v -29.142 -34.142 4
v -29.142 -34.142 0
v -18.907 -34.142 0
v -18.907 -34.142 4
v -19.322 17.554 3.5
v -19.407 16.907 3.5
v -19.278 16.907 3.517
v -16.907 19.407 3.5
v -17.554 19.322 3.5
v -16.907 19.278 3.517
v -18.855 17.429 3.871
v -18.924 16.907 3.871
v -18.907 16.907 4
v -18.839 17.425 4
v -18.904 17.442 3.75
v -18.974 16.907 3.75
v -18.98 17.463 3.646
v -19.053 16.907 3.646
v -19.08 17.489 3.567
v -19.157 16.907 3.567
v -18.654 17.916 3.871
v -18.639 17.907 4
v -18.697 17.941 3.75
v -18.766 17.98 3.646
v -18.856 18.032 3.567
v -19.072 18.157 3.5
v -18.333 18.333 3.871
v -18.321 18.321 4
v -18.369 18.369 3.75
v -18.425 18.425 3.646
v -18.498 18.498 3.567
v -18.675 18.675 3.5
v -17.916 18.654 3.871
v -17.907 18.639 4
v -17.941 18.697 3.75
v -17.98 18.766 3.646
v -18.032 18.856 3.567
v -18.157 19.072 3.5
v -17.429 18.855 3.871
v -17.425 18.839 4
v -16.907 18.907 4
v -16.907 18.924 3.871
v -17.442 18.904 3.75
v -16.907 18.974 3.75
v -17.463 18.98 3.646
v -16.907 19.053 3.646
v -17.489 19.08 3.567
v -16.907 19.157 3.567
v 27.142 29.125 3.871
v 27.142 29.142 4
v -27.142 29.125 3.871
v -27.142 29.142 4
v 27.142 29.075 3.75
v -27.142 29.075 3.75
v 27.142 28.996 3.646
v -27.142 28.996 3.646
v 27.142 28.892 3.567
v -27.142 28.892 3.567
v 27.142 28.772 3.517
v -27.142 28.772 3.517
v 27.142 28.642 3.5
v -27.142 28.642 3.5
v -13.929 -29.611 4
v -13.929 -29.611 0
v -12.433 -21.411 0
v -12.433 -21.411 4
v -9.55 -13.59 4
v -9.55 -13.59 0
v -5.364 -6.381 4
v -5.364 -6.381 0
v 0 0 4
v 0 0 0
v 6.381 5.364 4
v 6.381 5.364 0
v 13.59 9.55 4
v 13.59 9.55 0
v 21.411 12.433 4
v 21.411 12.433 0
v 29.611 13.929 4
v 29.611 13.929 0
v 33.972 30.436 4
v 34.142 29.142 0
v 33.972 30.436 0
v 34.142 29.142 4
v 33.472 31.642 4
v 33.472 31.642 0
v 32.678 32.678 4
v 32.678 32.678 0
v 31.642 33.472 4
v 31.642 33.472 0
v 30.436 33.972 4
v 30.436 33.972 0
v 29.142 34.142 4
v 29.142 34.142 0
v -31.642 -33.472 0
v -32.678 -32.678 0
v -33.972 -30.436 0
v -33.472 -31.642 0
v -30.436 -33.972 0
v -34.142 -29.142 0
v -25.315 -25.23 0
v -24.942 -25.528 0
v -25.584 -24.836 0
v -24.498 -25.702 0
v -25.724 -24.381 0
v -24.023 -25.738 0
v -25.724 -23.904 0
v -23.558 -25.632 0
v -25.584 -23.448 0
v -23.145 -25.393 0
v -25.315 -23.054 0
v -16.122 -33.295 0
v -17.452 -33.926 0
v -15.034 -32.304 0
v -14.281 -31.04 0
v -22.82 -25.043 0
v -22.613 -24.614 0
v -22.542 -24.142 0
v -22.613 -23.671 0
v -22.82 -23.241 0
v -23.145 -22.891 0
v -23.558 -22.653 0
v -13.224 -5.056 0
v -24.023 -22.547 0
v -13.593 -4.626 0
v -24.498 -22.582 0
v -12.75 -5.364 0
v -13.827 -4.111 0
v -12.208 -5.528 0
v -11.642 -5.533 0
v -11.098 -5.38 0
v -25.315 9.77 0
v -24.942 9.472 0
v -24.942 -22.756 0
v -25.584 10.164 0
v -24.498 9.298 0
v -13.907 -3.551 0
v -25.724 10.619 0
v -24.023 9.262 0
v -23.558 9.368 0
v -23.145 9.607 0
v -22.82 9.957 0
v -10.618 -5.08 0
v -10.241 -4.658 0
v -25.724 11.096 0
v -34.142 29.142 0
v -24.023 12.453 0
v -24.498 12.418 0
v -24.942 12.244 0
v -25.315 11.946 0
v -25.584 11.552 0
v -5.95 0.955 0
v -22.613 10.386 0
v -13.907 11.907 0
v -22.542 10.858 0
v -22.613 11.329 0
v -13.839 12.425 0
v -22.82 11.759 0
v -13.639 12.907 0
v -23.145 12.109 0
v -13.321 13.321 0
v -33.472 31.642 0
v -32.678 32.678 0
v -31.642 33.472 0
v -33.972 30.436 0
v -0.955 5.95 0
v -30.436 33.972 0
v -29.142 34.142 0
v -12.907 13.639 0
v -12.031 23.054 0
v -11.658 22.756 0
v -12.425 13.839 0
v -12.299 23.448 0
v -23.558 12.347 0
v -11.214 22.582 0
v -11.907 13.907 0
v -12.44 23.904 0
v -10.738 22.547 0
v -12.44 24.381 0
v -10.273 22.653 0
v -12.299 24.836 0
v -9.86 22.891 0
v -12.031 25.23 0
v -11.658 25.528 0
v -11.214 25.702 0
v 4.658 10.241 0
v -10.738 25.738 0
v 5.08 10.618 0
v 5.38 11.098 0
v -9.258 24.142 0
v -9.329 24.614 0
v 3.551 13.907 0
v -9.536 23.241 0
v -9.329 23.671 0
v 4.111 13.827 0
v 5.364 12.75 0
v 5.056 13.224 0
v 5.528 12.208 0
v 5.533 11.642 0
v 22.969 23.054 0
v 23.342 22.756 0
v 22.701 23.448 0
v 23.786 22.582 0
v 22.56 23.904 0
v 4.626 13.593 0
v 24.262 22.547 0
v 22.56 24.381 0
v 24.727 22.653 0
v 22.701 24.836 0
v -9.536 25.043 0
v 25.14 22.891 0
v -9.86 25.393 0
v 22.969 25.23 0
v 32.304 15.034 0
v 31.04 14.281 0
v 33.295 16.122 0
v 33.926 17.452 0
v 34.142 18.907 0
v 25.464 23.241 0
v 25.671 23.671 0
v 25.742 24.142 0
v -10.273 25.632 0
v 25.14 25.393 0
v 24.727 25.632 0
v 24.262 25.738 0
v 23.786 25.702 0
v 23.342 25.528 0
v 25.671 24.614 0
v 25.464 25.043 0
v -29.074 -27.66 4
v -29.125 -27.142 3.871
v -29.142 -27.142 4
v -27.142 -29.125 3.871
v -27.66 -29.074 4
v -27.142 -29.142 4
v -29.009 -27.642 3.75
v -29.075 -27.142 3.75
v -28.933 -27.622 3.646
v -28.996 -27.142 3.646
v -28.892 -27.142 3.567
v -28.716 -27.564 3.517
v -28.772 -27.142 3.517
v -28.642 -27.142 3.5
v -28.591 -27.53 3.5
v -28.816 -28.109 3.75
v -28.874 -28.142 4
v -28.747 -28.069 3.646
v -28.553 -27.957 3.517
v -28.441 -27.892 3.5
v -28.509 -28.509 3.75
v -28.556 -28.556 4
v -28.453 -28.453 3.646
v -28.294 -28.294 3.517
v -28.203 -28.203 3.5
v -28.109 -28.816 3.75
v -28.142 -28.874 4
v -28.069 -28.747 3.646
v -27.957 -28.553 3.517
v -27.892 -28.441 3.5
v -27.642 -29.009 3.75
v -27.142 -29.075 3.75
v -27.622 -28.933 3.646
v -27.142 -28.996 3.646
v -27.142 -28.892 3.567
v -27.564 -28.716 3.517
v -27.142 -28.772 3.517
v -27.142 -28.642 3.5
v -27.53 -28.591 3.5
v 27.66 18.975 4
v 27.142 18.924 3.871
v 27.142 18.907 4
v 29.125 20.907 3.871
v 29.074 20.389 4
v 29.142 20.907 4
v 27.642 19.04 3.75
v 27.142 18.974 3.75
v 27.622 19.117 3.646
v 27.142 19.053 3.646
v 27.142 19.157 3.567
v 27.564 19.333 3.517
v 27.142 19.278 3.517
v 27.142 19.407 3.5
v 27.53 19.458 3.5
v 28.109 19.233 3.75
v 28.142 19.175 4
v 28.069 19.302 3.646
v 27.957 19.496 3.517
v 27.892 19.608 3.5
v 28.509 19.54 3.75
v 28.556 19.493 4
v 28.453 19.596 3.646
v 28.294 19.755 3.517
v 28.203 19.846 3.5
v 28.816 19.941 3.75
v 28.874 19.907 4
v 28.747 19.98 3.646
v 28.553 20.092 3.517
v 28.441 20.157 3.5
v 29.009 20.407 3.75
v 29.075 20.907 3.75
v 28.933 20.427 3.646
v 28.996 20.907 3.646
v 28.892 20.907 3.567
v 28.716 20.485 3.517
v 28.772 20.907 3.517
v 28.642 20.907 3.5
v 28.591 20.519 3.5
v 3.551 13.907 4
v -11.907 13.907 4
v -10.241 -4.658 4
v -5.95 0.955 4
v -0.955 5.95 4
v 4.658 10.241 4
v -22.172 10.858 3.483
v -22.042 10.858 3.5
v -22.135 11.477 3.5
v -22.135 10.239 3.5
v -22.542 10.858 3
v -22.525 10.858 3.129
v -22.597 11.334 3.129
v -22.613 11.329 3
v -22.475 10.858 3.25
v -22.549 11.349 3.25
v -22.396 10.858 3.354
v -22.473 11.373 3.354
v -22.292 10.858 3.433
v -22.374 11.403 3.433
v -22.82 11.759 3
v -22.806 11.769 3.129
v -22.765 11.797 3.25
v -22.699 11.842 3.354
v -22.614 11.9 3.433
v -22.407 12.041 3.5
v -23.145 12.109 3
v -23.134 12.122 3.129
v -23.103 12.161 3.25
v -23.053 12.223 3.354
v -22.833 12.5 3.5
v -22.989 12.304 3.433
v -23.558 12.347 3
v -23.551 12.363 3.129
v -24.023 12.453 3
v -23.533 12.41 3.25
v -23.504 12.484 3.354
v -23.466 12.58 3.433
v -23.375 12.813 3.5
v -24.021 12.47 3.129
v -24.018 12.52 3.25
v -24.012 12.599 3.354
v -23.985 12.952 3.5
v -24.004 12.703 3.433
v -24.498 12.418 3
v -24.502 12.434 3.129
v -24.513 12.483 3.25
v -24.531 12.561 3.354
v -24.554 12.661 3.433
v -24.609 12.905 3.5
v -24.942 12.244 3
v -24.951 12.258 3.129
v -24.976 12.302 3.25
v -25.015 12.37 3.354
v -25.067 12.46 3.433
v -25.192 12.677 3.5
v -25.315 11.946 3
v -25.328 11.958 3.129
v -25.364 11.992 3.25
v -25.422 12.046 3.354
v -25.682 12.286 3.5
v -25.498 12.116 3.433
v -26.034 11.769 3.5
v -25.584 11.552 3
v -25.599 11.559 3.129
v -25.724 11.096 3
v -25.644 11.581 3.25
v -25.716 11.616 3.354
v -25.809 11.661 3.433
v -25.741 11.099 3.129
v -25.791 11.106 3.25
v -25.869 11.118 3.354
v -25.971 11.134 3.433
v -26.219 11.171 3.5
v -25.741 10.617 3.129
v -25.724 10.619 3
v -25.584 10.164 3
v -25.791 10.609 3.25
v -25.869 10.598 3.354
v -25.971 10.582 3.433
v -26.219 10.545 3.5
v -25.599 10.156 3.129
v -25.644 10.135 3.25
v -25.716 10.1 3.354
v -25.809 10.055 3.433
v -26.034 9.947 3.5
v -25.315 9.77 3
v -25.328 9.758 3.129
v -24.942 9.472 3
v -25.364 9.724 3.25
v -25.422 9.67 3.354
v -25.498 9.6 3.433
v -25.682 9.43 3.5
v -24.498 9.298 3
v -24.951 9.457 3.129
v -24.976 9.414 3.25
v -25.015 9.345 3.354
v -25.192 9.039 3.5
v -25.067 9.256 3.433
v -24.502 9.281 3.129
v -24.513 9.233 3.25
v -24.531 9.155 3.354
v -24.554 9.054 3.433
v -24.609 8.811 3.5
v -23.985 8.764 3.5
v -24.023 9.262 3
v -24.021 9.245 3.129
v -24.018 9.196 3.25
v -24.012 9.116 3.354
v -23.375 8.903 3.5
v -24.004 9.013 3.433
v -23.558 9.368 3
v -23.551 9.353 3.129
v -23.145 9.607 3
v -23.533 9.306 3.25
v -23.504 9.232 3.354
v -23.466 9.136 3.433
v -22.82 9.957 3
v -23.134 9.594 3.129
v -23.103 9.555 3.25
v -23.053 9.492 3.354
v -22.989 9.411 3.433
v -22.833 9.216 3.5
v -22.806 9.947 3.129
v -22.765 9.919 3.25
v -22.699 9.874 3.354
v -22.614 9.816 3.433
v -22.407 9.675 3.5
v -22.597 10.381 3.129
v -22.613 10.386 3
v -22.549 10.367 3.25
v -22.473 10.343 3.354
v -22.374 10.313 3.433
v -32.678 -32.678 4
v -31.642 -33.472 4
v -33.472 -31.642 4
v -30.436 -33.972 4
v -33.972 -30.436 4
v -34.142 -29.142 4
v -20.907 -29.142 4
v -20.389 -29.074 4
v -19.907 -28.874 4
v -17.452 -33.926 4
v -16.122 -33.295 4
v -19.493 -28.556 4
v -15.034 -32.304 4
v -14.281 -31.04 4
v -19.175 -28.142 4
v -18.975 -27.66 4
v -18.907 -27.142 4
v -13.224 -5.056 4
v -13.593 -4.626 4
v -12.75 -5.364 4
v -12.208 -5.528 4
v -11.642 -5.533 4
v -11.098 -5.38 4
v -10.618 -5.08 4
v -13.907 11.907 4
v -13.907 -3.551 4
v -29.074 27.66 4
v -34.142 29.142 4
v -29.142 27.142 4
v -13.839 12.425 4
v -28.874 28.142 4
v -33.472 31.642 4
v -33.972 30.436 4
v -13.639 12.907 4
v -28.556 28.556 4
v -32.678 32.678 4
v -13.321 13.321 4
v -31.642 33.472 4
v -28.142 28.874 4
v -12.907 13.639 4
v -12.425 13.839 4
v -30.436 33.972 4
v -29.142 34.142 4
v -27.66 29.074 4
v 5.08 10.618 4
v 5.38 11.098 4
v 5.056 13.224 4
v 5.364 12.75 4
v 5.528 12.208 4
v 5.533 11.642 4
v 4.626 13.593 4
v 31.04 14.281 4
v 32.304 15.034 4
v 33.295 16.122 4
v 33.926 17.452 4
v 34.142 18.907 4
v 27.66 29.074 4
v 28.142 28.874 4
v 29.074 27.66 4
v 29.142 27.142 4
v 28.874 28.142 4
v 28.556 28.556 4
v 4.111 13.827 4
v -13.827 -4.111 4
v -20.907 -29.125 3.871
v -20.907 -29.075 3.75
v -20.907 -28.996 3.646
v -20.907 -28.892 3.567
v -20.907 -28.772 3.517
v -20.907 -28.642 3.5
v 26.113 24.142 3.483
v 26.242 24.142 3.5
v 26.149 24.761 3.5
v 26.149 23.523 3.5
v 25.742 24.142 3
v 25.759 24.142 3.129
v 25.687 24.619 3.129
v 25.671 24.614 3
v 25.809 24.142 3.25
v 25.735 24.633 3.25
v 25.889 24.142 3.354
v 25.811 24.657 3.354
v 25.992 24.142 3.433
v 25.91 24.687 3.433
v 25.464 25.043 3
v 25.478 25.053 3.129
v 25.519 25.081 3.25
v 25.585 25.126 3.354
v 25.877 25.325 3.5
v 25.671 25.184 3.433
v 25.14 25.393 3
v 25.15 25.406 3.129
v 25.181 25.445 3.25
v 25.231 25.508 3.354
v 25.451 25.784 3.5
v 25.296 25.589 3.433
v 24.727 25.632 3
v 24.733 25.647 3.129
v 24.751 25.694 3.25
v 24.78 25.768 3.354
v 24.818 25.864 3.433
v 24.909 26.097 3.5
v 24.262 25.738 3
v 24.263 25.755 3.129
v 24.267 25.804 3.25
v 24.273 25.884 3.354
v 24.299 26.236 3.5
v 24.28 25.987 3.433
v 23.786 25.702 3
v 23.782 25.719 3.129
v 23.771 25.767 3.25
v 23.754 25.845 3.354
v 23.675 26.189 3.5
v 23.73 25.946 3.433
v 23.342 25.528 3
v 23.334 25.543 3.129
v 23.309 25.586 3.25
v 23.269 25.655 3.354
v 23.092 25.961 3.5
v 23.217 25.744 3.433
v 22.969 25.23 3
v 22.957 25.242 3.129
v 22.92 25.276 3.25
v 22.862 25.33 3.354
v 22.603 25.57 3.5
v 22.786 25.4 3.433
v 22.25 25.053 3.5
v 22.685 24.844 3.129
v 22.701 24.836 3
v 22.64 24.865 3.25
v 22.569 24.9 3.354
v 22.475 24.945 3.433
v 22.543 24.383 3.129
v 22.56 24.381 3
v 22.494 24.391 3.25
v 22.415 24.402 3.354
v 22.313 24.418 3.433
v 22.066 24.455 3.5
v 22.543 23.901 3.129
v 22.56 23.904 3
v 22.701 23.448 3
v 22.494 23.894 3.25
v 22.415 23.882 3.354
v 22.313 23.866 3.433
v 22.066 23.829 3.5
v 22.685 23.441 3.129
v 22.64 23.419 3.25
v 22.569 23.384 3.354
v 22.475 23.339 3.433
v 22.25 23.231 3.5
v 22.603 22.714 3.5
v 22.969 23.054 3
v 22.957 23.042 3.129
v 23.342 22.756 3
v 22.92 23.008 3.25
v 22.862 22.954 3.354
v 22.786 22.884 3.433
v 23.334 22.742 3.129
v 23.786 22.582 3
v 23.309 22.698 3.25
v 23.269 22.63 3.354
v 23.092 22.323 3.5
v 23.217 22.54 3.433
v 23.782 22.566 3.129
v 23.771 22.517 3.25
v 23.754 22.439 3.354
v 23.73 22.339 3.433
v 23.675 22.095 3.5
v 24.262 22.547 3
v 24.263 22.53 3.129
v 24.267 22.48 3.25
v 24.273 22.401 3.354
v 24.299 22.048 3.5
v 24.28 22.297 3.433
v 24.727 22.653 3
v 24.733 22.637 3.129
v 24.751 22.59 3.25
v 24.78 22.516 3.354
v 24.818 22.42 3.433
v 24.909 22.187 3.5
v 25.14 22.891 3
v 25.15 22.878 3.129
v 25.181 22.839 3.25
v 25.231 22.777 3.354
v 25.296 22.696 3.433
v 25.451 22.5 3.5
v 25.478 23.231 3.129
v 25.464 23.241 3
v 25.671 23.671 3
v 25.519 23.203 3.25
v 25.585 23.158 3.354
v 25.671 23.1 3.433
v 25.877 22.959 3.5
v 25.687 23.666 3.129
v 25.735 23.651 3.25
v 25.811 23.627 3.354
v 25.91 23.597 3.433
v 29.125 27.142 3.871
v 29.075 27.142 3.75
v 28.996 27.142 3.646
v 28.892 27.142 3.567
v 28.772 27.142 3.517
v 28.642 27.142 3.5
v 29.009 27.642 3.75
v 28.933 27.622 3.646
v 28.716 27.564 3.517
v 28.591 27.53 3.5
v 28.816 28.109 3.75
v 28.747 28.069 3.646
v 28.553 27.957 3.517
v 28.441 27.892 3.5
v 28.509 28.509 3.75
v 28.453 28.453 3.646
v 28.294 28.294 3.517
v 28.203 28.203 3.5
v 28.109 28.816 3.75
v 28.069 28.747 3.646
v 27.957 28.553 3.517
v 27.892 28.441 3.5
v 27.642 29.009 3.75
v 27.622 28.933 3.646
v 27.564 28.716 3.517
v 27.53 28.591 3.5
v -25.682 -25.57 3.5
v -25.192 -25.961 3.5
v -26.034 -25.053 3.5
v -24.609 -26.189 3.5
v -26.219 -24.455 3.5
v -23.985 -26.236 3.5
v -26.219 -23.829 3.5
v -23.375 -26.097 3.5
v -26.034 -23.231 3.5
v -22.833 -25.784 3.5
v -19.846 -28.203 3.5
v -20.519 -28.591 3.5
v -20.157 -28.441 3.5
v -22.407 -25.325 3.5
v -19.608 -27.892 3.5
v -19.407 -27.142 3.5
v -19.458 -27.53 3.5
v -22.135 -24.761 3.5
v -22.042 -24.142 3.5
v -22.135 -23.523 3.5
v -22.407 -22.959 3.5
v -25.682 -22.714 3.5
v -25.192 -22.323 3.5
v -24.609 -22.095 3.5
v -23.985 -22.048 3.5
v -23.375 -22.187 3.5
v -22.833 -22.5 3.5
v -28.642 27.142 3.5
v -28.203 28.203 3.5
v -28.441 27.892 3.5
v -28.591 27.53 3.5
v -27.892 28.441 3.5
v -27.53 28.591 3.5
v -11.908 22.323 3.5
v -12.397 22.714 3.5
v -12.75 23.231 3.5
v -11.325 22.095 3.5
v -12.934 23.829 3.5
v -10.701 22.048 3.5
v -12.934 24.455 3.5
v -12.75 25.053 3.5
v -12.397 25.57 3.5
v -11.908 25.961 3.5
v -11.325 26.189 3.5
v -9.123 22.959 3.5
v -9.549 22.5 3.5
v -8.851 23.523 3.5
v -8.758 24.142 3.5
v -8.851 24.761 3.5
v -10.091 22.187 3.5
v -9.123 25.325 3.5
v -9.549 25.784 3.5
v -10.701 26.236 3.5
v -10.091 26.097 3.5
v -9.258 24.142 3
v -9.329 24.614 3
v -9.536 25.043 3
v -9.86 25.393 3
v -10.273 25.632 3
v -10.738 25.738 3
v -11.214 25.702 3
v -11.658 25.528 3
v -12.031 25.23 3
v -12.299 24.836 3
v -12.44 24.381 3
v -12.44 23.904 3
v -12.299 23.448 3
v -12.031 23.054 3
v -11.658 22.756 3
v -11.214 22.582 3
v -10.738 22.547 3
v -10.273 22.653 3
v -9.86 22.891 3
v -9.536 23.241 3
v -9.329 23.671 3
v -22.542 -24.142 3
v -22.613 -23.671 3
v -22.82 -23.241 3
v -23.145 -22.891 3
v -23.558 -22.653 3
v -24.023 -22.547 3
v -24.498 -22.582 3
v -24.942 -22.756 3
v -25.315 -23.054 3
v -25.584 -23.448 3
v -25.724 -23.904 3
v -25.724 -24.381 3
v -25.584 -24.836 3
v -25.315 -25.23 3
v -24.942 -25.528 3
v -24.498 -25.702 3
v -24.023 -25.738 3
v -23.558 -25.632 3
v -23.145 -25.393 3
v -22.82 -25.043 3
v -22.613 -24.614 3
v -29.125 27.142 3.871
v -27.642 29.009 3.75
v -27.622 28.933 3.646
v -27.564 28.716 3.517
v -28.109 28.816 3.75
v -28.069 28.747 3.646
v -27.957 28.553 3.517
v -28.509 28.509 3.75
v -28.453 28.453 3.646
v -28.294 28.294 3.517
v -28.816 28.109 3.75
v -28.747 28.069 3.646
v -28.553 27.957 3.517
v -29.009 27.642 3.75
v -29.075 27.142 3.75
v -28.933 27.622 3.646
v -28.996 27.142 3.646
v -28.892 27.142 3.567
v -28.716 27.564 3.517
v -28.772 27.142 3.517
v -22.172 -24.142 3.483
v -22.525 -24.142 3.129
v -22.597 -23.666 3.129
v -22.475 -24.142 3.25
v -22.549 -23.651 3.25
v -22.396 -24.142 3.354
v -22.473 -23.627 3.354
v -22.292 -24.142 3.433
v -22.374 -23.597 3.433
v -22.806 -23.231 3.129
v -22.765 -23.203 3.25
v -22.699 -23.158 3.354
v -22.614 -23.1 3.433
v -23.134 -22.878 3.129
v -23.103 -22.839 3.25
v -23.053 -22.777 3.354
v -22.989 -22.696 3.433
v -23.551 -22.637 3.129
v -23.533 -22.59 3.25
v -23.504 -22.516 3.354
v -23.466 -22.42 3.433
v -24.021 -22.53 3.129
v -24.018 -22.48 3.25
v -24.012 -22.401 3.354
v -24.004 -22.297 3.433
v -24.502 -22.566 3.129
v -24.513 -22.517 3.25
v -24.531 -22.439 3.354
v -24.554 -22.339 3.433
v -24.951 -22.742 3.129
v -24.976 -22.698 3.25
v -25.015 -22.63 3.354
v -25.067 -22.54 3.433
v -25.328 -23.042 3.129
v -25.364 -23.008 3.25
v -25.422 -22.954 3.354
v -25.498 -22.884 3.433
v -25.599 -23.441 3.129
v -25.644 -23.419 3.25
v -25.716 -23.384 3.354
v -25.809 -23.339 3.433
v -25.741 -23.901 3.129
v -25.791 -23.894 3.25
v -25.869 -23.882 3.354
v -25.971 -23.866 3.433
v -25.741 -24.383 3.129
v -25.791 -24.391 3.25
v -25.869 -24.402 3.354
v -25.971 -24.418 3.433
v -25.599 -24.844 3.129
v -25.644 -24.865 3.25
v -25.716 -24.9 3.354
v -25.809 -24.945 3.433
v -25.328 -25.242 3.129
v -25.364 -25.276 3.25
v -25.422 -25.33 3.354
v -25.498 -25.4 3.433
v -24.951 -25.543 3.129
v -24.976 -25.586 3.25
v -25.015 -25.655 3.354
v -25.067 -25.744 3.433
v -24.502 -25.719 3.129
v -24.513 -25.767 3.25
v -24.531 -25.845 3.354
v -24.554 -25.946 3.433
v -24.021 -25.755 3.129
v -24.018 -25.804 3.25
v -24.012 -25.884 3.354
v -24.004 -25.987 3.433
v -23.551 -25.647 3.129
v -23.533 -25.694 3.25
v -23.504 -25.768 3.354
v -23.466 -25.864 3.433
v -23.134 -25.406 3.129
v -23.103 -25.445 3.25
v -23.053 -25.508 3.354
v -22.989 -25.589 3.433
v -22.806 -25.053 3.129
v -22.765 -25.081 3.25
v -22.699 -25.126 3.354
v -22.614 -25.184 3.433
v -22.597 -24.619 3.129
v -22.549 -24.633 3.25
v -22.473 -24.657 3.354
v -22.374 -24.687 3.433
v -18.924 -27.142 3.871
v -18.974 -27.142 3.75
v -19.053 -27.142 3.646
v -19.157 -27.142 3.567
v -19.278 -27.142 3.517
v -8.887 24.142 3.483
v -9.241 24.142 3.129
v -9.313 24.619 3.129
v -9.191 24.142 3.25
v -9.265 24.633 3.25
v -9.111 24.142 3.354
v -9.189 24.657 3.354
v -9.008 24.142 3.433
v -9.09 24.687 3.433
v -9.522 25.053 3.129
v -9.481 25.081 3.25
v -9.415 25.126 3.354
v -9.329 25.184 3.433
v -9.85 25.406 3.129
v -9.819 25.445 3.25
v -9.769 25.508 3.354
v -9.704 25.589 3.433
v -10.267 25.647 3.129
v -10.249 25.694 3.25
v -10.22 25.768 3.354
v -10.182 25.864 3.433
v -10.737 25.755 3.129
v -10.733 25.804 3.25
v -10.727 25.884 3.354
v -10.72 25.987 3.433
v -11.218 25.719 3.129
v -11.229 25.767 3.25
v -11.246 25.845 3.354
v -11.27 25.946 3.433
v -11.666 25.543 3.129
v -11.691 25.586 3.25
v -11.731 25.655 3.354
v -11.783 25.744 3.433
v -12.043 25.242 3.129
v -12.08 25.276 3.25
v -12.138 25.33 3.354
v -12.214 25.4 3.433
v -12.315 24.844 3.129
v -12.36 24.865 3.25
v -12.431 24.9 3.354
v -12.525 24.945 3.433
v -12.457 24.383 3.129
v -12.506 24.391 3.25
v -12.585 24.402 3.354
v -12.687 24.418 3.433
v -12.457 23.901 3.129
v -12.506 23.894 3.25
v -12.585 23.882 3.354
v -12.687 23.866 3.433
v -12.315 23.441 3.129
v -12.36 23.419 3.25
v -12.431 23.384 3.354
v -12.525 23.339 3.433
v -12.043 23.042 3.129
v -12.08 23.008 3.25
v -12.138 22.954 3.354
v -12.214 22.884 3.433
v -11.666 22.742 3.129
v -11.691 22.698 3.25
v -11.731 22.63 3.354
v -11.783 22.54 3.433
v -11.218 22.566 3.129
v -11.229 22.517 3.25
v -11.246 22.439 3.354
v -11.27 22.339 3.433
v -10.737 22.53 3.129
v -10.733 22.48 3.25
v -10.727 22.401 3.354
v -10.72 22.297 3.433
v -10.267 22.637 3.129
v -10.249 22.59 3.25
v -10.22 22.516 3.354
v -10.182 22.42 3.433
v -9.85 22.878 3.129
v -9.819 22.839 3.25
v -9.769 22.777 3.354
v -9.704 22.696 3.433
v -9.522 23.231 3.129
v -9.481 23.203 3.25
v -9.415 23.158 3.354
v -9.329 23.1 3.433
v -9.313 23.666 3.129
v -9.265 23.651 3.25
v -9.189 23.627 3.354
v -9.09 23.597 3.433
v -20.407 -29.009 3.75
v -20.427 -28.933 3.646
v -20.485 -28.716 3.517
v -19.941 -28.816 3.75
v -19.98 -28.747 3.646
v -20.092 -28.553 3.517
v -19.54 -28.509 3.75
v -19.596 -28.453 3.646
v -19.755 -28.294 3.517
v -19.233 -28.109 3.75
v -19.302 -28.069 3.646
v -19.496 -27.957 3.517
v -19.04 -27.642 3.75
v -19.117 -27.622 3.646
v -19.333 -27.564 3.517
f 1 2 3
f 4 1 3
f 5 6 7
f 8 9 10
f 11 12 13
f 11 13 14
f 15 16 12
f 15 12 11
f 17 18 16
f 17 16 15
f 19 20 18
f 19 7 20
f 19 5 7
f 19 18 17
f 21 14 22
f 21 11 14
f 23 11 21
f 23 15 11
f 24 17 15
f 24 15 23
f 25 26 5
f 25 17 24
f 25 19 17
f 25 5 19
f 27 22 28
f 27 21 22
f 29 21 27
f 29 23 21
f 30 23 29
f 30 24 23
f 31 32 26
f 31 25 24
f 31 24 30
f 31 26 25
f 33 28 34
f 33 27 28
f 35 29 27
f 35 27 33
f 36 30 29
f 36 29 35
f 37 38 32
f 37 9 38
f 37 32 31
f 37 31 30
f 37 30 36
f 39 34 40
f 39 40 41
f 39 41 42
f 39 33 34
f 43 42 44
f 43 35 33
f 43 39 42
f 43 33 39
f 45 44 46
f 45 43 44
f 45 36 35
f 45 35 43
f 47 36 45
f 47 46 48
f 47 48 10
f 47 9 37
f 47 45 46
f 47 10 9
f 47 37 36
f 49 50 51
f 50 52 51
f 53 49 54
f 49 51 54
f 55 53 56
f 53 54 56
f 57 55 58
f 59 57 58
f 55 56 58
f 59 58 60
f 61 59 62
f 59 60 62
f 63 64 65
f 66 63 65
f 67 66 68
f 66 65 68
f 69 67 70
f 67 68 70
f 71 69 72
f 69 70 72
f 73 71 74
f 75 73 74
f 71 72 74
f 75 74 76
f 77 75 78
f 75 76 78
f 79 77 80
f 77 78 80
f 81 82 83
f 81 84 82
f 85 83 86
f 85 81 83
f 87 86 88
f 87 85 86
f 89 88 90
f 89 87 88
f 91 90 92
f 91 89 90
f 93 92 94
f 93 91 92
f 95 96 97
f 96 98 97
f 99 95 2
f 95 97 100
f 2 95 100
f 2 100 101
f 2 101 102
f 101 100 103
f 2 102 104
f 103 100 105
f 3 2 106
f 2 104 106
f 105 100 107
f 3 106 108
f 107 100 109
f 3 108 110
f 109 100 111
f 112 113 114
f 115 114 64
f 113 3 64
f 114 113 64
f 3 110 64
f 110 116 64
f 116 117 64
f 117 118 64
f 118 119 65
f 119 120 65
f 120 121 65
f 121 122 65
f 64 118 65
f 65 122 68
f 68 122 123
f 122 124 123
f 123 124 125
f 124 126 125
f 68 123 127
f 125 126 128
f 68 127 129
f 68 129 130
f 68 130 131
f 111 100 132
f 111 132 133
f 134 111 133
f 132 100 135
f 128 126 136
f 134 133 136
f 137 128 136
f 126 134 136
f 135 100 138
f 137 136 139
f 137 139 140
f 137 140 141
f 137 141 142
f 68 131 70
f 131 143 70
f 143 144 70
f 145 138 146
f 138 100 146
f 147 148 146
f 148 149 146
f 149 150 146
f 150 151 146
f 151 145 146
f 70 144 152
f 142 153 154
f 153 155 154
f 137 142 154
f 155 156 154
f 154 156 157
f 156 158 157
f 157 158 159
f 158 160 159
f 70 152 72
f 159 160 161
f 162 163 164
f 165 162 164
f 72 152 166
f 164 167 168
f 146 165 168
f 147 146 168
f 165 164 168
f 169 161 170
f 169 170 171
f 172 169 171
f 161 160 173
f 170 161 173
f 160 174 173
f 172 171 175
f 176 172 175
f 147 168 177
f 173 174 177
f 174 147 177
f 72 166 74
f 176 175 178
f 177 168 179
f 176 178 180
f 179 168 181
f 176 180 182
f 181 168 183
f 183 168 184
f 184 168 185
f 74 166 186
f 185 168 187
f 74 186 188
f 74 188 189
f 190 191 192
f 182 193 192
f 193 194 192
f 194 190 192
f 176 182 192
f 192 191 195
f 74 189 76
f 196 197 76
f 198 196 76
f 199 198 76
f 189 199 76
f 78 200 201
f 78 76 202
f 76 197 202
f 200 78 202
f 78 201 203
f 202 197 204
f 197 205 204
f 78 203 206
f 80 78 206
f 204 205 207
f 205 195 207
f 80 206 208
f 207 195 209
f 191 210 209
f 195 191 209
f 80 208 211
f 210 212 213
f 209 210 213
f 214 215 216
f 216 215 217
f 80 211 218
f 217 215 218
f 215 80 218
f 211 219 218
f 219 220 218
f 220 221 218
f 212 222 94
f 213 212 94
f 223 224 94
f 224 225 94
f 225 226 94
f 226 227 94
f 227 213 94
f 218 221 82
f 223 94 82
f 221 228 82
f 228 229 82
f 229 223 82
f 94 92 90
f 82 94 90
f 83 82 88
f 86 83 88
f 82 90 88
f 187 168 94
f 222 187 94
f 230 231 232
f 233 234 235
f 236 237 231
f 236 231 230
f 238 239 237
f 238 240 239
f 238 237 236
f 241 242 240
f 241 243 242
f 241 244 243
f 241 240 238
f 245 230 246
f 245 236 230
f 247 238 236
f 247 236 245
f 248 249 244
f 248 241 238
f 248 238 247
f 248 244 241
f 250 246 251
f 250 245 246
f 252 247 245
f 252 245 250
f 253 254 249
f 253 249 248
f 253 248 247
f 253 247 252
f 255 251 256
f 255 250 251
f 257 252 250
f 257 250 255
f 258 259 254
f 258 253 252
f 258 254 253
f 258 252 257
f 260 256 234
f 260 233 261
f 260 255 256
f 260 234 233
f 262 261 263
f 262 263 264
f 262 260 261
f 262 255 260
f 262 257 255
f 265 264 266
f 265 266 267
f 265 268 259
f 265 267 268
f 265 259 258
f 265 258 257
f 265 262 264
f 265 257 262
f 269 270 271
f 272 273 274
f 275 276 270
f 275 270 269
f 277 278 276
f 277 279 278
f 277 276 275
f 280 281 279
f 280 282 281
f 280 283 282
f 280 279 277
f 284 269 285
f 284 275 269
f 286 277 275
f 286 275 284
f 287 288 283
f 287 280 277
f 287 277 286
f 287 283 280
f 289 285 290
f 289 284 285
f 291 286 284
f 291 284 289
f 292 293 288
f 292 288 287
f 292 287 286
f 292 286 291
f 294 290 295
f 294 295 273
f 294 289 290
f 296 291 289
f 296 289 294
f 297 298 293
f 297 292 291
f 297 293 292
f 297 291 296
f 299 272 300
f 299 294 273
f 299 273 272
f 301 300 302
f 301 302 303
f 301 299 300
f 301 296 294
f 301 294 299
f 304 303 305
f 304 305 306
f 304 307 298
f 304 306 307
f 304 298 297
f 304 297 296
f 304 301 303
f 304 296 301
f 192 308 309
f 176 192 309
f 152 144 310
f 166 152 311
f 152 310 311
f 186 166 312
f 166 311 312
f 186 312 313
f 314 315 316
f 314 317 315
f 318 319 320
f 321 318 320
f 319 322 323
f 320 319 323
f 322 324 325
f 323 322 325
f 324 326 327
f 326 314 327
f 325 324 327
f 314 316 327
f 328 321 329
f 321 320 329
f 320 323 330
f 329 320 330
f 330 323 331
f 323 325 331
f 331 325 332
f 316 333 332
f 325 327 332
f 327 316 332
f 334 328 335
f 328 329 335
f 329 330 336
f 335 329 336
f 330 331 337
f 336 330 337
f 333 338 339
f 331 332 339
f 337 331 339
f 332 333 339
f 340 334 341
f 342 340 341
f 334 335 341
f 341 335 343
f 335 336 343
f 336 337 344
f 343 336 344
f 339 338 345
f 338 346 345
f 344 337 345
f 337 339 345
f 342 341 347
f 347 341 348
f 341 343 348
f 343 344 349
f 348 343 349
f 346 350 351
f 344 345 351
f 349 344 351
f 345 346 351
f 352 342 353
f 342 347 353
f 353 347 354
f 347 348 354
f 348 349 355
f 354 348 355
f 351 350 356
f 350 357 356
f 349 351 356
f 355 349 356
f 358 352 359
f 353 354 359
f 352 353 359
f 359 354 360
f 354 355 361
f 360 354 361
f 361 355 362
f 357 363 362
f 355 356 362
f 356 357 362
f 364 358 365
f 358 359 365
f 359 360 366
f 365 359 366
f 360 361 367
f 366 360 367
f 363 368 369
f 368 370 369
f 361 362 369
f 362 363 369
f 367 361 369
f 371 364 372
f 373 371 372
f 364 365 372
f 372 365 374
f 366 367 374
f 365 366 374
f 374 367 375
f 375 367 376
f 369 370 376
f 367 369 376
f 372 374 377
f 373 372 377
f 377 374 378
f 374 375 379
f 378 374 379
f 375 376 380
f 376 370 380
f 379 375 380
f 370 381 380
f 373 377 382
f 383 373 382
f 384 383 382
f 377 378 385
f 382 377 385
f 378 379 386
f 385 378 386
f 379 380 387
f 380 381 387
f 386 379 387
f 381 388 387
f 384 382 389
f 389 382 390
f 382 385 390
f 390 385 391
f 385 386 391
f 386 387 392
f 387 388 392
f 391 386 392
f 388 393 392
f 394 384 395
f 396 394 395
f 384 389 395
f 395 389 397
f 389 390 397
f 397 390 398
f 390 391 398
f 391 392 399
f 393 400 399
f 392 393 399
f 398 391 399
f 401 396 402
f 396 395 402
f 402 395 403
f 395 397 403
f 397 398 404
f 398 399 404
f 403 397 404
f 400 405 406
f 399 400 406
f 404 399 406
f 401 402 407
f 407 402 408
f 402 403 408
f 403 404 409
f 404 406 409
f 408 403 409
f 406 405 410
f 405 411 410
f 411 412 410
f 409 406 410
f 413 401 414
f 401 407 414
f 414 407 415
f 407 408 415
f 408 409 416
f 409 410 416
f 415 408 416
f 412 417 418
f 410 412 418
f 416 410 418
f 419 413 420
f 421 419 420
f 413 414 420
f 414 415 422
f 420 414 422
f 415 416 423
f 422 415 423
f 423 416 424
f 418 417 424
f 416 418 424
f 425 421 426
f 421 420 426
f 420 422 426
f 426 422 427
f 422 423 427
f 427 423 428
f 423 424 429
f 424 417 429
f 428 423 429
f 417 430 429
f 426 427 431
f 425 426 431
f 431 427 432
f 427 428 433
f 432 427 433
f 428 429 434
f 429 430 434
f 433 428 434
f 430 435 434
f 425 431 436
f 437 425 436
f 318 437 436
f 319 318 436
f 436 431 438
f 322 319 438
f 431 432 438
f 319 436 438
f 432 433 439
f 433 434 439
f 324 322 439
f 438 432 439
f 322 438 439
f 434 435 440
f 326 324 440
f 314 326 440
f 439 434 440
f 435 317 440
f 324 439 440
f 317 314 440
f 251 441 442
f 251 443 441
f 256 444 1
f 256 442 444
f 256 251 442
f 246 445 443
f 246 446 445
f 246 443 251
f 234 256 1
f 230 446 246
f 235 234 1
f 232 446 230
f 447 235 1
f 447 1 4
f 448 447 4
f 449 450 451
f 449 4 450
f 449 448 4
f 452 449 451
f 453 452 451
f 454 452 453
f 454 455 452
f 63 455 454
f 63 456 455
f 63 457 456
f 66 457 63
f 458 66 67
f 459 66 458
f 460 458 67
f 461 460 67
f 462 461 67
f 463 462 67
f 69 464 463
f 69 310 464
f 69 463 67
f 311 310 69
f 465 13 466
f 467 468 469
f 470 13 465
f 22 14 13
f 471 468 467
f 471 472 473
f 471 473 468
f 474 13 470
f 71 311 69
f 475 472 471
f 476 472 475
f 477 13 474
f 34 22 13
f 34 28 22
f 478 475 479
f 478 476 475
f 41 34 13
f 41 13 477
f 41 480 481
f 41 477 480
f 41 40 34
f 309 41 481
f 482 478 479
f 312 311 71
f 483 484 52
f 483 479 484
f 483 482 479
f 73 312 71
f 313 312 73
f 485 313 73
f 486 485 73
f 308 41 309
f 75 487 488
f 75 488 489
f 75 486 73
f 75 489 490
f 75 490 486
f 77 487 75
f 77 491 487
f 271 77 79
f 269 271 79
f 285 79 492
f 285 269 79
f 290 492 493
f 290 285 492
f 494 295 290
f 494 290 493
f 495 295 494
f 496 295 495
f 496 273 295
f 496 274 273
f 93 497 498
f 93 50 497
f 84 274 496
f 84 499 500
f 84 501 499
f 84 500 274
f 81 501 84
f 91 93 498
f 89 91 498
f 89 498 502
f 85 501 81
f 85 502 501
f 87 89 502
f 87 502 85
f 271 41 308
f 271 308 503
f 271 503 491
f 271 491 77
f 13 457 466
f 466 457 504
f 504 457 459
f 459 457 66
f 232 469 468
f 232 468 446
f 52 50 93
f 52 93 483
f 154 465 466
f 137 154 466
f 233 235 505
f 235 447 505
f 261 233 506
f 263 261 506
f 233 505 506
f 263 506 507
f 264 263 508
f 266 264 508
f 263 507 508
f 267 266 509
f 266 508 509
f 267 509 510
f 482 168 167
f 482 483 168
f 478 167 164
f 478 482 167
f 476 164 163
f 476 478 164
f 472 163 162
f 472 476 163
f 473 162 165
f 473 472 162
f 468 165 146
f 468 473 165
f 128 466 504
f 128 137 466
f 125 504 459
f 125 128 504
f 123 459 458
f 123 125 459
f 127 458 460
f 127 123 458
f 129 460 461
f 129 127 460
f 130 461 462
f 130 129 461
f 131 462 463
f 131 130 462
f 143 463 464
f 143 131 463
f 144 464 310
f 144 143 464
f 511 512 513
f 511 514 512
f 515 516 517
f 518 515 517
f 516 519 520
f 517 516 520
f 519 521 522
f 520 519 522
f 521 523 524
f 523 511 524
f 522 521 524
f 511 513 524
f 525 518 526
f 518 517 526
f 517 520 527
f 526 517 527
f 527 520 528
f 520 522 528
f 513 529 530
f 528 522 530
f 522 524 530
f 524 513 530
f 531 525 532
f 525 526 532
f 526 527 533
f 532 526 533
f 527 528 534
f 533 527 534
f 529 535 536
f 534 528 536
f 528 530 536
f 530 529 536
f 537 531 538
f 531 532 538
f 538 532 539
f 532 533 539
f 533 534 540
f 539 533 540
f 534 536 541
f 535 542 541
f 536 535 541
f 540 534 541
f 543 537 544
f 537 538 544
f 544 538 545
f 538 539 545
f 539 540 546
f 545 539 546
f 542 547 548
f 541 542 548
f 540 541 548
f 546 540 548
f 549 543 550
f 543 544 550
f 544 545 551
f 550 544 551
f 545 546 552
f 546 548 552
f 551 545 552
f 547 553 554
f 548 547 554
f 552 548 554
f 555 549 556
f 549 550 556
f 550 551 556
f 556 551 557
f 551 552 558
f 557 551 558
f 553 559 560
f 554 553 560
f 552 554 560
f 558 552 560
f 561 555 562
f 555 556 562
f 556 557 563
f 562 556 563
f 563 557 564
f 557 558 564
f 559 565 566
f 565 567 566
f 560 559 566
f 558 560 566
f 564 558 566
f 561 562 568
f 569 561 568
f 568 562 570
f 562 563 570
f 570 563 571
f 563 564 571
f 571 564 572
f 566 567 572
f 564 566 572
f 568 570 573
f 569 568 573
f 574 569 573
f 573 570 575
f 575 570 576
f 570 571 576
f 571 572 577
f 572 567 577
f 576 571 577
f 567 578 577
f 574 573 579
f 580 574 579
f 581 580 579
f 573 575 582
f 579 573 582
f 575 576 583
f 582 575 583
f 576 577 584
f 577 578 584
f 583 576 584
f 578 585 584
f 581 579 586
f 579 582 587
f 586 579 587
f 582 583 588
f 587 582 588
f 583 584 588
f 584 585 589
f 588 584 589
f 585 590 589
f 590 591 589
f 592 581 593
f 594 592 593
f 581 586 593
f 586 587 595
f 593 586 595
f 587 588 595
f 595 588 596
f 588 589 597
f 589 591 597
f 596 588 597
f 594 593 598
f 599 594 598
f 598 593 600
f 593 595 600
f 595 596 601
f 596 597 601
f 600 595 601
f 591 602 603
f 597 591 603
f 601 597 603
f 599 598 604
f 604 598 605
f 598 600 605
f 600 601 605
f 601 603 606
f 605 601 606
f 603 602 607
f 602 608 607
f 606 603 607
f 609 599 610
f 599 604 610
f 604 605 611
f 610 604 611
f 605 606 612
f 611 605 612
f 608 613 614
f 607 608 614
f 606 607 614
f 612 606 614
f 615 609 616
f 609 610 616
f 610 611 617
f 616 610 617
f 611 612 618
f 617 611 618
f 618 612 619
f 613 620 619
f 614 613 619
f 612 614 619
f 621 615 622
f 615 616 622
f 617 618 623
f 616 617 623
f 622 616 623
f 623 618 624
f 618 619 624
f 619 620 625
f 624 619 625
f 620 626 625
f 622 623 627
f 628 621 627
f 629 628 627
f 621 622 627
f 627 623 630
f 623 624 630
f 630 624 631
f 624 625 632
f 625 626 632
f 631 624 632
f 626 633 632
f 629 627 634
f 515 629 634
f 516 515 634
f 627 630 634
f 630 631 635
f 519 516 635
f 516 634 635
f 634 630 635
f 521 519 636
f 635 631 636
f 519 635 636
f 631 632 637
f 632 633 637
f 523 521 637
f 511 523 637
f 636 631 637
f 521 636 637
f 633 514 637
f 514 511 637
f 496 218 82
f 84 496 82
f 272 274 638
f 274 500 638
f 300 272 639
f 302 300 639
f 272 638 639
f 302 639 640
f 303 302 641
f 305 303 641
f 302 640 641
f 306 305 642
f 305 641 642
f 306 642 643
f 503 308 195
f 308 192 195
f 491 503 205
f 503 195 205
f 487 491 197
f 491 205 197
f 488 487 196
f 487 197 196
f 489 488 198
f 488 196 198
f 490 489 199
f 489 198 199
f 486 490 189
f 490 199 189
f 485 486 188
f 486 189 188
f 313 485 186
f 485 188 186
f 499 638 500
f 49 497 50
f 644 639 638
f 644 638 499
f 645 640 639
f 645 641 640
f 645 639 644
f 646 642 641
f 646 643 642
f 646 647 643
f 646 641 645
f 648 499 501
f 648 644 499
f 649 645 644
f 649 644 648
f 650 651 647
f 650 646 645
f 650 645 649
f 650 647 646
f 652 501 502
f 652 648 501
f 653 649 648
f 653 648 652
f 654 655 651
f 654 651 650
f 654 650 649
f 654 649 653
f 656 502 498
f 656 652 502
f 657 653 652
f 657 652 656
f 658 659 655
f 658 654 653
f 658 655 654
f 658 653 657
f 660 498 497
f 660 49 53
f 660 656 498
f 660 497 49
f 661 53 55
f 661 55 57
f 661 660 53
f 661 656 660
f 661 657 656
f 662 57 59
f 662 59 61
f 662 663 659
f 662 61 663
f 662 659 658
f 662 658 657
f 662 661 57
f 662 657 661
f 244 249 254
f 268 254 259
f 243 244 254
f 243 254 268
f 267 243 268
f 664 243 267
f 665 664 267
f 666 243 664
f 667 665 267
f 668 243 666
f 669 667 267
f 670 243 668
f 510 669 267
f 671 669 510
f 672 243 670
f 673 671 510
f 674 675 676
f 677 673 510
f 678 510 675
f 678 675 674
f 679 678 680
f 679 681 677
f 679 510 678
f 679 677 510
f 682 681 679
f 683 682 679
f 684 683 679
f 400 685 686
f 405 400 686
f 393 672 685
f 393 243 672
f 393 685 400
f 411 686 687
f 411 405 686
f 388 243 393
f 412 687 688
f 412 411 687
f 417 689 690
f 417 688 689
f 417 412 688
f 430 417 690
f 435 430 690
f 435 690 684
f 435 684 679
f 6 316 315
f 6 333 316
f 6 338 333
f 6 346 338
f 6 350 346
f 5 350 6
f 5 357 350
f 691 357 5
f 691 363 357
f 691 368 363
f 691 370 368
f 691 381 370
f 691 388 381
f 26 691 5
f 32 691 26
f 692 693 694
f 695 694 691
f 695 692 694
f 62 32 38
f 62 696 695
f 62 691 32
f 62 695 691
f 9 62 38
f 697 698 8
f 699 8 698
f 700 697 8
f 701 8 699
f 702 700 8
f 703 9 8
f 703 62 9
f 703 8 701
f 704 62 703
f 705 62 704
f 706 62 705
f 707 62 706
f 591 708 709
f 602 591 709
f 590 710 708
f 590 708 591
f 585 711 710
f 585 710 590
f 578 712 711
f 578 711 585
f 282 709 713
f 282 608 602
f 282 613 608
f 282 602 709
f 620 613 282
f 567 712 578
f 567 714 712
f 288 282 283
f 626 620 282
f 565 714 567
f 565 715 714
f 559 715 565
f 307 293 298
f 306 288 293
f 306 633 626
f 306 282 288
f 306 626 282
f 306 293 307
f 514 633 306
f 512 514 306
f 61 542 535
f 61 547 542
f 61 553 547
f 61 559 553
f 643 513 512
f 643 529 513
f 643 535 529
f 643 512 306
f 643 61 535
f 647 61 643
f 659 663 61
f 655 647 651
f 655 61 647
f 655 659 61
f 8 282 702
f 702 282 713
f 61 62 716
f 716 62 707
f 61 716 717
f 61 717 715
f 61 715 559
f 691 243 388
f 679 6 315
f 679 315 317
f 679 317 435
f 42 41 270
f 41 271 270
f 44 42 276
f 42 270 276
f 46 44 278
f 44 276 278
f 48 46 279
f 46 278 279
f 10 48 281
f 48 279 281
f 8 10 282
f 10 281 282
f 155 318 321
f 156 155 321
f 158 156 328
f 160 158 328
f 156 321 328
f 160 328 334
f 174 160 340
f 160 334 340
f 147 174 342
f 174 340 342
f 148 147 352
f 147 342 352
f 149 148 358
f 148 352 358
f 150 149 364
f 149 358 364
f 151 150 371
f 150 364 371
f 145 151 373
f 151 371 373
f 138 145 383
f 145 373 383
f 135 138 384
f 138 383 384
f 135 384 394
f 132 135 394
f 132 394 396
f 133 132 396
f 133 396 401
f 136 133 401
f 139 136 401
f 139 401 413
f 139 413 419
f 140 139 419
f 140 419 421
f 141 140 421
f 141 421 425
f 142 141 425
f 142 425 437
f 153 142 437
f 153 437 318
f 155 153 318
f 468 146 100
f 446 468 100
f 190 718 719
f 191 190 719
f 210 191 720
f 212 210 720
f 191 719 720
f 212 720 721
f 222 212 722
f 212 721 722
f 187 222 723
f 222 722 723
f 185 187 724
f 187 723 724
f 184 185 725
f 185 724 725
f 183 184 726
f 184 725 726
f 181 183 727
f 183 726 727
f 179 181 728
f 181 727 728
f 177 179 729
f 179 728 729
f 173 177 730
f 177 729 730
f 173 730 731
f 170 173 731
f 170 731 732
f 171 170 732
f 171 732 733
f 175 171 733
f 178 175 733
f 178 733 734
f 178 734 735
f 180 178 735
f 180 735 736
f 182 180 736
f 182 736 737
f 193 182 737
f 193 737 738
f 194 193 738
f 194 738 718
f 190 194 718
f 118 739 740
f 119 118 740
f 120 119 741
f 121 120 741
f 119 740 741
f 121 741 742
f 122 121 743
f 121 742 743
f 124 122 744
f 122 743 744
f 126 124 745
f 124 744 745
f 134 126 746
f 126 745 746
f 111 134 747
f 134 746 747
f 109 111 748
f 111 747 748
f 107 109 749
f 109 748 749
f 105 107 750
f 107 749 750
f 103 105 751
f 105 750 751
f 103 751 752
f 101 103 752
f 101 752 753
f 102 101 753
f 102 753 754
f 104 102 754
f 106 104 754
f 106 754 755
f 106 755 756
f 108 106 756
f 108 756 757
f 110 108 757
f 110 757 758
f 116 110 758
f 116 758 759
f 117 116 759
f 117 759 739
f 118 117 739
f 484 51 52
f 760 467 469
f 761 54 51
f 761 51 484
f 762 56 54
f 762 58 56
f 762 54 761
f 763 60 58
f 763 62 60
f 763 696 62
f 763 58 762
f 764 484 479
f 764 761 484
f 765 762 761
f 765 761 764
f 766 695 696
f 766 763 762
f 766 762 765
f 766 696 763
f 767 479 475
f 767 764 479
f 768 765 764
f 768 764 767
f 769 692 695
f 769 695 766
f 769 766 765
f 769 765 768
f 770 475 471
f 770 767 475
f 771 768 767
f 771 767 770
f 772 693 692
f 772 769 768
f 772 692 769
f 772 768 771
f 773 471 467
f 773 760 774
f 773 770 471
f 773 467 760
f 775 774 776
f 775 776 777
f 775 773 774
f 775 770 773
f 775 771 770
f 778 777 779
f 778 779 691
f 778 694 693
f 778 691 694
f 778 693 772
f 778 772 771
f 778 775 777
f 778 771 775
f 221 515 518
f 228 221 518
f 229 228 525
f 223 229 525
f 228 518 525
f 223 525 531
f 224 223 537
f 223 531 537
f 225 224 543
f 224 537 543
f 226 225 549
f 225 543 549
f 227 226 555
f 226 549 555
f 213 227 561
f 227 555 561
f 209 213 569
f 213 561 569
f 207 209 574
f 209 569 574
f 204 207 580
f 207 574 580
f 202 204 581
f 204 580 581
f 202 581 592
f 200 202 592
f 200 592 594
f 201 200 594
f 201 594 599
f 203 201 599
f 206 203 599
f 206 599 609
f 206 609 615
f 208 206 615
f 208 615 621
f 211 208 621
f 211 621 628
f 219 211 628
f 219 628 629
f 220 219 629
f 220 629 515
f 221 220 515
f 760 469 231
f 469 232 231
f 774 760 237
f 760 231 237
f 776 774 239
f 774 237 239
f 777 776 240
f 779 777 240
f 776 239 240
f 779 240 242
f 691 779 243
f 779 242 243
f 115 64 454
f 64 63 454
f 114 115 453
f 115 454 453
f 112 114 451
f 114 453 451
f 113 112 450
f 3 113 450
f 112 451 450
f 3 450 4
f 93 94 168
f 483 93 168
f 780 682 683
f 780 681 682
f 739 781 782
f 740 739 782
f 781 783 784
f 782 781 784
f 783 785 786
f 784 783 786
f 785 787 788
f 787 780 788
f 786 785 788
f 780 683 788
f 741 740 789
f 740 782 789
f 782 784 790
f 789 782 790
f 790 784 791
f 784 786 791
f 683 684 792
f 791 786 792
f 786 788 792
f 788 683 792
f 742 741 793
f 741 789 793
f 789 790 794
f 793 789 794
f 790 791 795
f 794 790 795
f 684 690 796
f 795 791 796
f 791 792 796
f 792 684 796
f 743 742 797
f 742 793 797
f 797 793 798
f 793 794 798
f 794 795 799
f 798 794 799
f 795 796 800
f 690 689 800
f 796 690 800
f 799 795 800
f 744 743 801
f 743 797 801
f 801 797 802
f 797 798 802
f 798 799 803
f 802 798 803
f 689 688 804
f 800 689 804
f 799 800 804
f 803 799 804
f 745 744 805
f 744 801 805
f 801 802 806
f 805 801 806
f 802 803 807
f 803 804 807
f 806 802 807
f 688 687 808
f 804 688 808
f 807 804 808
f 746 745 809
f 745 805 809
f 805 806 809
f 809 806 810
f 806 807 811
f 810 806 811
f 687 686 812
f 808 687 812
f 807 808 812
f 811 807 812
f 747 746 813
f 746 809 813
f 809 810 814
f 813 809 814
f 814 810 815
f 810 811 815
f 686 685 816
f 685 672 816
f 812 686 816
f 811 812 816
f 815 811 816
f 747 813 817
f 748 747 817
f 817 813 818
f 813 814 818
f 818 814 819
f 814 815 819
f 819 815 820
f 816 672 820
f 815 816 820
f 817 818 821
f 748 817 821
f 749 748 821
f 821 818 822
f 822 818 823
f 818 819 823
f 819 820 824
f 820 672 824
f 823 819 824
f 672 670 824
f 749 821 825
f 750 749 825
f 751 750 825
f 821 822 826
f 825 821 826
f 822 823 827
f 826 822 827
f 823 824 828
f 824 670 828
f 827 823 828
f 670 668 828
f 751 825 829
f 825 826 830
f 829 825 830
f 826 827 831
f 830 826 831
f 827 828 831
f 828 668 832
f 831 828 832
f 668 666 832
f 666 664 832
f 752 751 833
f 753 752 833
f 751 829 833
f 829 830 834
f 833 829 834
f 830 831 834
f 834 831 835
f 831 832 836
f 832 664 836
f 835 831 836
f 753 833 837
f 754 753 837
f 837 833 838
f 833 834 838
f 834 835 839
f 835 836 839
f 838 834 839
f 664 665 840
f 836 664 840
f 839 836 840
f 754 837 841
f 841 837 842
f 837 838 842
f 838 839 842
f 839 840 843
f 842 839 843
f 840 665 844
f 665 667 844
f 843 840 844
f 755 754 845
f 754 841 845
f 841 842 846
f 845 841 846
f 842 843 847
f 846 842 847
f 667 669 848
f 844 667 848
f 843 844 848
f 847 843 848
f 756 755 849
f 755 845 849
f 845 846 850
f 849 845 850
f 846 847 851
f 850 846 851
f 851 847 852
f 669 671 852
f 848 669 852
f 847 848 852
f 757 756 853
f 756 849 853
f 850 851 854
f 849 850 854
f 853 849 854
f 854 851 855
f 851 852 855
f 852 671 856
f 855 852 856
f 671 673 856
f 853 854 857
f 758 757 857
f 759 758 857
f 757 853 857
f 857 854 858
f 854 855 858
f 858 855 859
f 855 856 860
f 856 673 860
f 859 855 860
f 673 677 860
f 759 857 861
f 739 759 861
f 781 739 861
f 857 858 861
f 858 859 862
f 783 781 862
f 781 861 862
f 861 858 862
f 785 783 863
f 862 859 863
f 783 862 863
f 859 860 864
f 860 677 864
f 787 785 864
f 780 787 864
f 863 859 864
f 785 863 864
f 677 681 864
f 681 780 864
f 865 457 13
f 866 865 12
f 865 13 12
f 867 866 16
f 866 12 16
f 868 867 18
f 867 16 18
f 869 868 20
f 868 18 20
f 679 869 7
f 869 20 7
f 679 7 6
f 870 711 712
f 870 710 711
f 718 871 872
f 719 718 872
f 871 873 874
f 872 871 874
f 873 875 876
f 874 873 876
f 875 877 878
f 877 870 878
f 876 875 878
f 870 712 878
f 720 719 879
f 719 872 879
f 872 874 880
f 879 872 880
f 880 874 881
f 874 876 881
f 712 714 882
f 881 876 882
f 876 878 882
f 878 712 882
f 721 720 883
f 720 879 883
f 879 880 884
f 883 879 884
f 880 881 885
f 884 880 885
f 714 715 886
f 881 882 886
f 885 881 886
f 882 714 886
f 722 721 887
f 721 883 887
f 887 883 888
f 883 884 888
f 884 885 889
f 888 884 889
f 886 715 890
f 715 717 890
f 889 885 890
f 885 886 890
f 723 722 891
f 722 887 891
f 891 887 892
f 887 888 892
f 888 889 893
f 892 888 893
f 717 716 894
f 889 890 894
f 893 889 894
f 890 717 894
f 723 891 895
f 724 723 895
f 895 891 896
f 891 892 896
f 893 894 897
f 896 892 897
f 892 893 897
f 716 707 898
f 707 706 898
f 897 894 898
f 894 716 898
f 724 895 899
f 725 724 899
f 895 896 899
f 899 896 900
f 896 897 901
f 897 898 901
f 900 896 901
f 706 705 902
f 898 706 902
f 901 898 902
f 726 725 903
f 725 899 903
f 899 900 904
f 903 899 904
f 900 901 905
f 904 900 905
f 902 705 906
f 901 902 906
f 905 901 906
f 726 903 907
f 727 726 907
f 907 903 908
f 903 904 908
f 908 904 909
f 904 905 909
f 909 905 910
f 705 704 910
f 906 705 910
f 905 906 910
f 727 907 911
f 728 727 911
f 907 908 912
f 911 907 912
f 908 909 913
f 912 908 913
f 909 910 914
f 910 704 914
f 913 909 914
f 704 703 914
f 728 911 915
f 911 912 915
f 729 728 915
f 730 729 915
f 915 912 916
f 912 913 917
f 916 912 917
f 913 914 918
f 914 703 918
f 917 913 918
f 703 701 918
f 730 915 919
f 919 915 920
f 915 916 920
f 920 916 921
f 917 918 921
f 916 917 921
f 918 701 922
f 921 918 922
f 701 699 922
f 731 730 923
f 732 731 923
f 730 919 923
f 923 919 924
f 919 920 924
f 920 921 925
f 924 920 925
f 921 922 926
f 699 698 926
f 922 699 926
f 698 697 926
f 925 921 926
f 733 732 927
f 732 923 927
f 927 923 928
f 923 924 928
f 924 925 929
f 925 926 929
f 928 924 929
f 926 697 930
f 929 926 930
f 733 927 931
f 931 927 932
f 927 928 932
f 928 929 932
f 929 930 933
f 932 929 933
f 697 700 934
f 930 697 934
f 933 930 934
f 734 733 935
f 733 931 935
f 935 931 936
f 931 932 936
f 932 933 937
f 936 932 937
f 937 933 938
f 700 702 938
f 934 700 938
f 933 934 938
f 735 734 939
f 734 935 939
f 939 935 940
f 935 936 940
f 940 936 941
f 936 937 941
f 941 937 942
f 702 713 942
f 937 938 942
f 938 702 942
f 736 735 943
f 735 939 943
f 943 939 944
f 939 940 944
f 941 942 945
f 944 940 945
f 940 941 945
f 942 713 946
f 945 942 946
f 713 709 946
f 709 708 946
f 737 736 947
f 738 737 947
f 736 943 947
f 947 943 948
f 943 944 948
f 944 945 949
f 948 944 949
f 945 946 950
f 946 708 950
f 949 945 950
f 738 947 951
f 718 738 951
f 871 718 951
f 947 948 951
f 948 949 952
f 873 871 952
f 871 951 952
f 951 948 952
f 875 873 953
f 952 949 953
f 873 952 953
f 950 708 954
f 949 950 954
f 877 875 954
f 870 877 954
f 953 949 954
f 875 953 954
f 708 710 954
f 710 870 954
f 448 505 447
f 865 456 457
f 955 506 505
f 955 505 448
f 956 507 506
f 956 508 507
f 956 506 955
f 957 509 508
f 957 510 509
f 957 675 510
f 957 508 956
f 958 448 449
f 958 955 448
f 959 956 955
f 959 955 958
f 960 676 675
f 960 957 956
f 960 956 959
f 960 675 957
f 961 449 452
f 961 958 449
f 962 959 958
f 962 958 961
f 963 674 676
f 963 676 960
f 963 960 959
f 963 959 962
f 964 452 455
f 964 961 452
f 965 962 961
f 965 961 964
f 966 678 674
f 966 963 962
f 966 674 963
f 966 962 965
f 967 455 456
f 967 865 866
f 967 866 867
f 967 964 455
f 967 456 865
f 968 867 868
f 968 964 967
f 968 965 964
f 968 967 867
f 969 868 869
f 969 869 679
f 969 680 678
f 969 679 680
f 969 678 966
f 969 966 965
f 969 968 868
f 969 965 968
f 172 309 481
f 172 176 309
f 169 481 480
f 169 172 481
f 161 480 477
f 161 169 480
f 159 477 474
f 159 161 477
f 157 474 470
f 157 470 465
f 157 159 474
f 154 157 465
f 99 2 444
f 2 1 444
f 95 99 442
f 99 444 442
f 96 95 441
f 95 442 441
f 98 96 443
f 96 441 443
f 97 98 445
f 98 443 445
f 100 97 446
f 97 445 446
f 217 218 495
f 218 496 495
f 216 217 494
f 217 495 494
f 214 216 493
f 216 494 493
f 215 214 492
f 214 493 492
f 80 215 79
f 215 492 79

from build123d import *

# Parameters (mm, degrees)
F1_DEPTH = 4
F2_R     = 1.6
F3_DEPTH = 4.001
F4_R     = 5
F5_R     = 1.6
F6_DEPTH = 0.5
F7_R     = 0.49999
F9_DEPTH = 4.001
F10_R    = 2


# Not quite as in the source:
# - a fillet or chamfer is up to 0.001 mm smaller than in the source, because OpenCascade refuses the exact size


with BuildPart() as f1:
    # F0 (on Top) → F1 (new body)
    with BuildSketch(Plane.XY):
        with BuildLine():
            Line((34.1421356237, 14.1421356237), (34.1421356237, 34.1421356237))
            Line((34.1421356237, 34.1421356237), (-34.1421356237, 34.1421356237))
            Line((-34.1421356237, 34.1421356237), (-34.1421356237, -34.1421356237))
            Line((-34.1421356237, -34.1421356237), (-14.1421356237, -34.1421356237))
            ThreePointArc((-14.1421356237, -34.1421356237), (0, 0), (34.1421356237, 14.1421356237))
        make_face()
    extrude(amount=F1_DEPTH)

    # F2 (on face) → F3 (cut, through all)
    with BuildSketch(Plane.XY.offset(4)):
        with Locations((-24.1421356237, -24.1421356237)):
            Circle(F2_R)
        with Locations((-10.8578643763, 24.1421356237)):
            Circle(F2_R)
        with Locations((24.1421356237, 24.1421356237)):
            Circle(F2_R)
        with Locations((-24.1421356237, 10.8578643763)):
            Circle(F2_R)
    extrude(amount=-F3_DEPTH, mode=Mode.SUBTRACT)

    # F4
    f4_edges = [f1.edges().sort_by_distance(p)[0] for p in [
        (-14.142136, -34.142136, 2),
        (-34.142136, -34.142136, 2),
        (34.142136, 14.142136, 2),
        (34.142136, 34.142136, 2),
        (-34.142136, 34.142136, 2),
    ]]
    fillet(f4_edges, radius=F4_R)

    # F5 (on face) → F6 (cut)
    with BuildSketch(Plane.XY.offset(4)):
        with BuildLine():
            ThreePointArc((29.1421356237, 27.1421356237), (28.5563491861, 28.5563491861), (27.1421356237, 29.1421356237))
            Line((27.1421356237, 29.1421356237), (-27.1421356237, 29.1421356237))
            ThreePointArc((-27.1421356237, 29.1421356237), (-28.5563491861, 28.5563491861), (-29.1421356237, 27.1421356237))
            Line((-29.1421356237, 27.1421356237), (-29.1421356237, -27.1421356237))
            ThreePointArc((-29.1421356237, -27.1421356237), (-28.5563491861, -28.5563491861), (-27.1421356237, -29.1421356237))
            Line((-27.1421356237, -29.1421356237), (-20.9070261262, -29.1421356237))
            ThreePointArc((-20.9070261262, -29.1421356237), (-19.4928125639, -28.5563491861), (-18.9070261262, -27.1421356237))
            Line((-18.9070261262, -27.1421356237), (-18.9070261262, 16.9070261262))
            ThreePointArc((-18.9070261262, 16.9070261262), (-18.3212396886, 18.3212396886), (-16.9070261262, 18.9070261262))
            Line((-16.9070261262, 18.9070261262), (27.1421356237, 18.9070261262))
            ThreePointArc((27.1421356237, 18.9070261262), (28.5563491861, 19.4928125639), (29.1421356237, 20.9070261262))
            Line((29.1421356237, 20.9070261262), (29.1421356237, 27.1421356237))
        make_face()
        with Locations((-24.1421356237, -24.1421356237)):
            Circle(F5_R, mode=Mode.SUBTRACT)
        with Locations((-24.1421356237, 10.8578643763)):
            Circle(F5_R, mode=Mode.SUBTRACT)
        with Locations((-10.8578643763, 24.1421356237)):
            Circle(F5_R, mode=Mode.SUBTRACT)
        with Locations((24.1421356237, 24.1421356237)):
            Circle(F5_R, mode=Mode.SUBTRACT)
    extrude(amount=-F6_DEPTH, mode=Mode.SUBTRACT)

    # F7 (radius 0.5 in the source; OpenCascade refuses exactly that, so slightly less here)
    f7_edges = [f1.edges().sort_by_distance(p)[0] for p in [
        (-18.32124, 18.32124, 3.5),
        (5.117555, 18.907026, 3.5),
        (28.556349, 19.492813, 3.5),
        (29.142136, 24.024581, 3.5),
        (28.556349, 28.556349, 3.5),
        (0, 29.142136, 3.5),
        (-28.556349, 28.556349, 3.5),
        (-29.142136, 0, 3.5),
        (-28.556349, -28.556349, 3.5),
        (-24.024581, -29.142136, 3.5),
        (-19.492813, -28.556349, 3.5),
        (-18.907026, -5.117555, 3.5),
        (-25.742136, -24.142136, 3.5),
        (-25.742136, 10.857864, 3.5),
        (-12.457864, 24.142136, 3.5),
        (22.542136, 24.142136, 3.5),
    ]]
    fillet(f7_edges, radius=F7_R)

    # F8 (on face) → F9 (cut, through all)
    with BuildSketch(Plane.XY.offset(4)):
        with BuildLine():
            ThreePointArc((-13.9070261262, -11.1097319823), (-3.5355339059, 3.5355339059), (11.1097319823, 13.9070261262))
            Line((11.1097319823, 13.9070261262), (-13.9070261262, 13.9070261262))
            Line((-13.9070261262, 13.9070261262), (-13.9070261262, -11.1097319823))
        make_face()
    extrude(amount=-F9_DEPTH, mode=Mode.SUBTRACT)

    # F10
    f10_edges = [f1.edges().sort_by_distance(p)[0] for p in [
        (-13.907026, 13.907026, 2),
        (-13.907026, -11.109732, 2),
        (11.109732, 13.907026, 2),
    ]]
    fillet(f10_edges, radius=F10_R)


solid = f1.part
